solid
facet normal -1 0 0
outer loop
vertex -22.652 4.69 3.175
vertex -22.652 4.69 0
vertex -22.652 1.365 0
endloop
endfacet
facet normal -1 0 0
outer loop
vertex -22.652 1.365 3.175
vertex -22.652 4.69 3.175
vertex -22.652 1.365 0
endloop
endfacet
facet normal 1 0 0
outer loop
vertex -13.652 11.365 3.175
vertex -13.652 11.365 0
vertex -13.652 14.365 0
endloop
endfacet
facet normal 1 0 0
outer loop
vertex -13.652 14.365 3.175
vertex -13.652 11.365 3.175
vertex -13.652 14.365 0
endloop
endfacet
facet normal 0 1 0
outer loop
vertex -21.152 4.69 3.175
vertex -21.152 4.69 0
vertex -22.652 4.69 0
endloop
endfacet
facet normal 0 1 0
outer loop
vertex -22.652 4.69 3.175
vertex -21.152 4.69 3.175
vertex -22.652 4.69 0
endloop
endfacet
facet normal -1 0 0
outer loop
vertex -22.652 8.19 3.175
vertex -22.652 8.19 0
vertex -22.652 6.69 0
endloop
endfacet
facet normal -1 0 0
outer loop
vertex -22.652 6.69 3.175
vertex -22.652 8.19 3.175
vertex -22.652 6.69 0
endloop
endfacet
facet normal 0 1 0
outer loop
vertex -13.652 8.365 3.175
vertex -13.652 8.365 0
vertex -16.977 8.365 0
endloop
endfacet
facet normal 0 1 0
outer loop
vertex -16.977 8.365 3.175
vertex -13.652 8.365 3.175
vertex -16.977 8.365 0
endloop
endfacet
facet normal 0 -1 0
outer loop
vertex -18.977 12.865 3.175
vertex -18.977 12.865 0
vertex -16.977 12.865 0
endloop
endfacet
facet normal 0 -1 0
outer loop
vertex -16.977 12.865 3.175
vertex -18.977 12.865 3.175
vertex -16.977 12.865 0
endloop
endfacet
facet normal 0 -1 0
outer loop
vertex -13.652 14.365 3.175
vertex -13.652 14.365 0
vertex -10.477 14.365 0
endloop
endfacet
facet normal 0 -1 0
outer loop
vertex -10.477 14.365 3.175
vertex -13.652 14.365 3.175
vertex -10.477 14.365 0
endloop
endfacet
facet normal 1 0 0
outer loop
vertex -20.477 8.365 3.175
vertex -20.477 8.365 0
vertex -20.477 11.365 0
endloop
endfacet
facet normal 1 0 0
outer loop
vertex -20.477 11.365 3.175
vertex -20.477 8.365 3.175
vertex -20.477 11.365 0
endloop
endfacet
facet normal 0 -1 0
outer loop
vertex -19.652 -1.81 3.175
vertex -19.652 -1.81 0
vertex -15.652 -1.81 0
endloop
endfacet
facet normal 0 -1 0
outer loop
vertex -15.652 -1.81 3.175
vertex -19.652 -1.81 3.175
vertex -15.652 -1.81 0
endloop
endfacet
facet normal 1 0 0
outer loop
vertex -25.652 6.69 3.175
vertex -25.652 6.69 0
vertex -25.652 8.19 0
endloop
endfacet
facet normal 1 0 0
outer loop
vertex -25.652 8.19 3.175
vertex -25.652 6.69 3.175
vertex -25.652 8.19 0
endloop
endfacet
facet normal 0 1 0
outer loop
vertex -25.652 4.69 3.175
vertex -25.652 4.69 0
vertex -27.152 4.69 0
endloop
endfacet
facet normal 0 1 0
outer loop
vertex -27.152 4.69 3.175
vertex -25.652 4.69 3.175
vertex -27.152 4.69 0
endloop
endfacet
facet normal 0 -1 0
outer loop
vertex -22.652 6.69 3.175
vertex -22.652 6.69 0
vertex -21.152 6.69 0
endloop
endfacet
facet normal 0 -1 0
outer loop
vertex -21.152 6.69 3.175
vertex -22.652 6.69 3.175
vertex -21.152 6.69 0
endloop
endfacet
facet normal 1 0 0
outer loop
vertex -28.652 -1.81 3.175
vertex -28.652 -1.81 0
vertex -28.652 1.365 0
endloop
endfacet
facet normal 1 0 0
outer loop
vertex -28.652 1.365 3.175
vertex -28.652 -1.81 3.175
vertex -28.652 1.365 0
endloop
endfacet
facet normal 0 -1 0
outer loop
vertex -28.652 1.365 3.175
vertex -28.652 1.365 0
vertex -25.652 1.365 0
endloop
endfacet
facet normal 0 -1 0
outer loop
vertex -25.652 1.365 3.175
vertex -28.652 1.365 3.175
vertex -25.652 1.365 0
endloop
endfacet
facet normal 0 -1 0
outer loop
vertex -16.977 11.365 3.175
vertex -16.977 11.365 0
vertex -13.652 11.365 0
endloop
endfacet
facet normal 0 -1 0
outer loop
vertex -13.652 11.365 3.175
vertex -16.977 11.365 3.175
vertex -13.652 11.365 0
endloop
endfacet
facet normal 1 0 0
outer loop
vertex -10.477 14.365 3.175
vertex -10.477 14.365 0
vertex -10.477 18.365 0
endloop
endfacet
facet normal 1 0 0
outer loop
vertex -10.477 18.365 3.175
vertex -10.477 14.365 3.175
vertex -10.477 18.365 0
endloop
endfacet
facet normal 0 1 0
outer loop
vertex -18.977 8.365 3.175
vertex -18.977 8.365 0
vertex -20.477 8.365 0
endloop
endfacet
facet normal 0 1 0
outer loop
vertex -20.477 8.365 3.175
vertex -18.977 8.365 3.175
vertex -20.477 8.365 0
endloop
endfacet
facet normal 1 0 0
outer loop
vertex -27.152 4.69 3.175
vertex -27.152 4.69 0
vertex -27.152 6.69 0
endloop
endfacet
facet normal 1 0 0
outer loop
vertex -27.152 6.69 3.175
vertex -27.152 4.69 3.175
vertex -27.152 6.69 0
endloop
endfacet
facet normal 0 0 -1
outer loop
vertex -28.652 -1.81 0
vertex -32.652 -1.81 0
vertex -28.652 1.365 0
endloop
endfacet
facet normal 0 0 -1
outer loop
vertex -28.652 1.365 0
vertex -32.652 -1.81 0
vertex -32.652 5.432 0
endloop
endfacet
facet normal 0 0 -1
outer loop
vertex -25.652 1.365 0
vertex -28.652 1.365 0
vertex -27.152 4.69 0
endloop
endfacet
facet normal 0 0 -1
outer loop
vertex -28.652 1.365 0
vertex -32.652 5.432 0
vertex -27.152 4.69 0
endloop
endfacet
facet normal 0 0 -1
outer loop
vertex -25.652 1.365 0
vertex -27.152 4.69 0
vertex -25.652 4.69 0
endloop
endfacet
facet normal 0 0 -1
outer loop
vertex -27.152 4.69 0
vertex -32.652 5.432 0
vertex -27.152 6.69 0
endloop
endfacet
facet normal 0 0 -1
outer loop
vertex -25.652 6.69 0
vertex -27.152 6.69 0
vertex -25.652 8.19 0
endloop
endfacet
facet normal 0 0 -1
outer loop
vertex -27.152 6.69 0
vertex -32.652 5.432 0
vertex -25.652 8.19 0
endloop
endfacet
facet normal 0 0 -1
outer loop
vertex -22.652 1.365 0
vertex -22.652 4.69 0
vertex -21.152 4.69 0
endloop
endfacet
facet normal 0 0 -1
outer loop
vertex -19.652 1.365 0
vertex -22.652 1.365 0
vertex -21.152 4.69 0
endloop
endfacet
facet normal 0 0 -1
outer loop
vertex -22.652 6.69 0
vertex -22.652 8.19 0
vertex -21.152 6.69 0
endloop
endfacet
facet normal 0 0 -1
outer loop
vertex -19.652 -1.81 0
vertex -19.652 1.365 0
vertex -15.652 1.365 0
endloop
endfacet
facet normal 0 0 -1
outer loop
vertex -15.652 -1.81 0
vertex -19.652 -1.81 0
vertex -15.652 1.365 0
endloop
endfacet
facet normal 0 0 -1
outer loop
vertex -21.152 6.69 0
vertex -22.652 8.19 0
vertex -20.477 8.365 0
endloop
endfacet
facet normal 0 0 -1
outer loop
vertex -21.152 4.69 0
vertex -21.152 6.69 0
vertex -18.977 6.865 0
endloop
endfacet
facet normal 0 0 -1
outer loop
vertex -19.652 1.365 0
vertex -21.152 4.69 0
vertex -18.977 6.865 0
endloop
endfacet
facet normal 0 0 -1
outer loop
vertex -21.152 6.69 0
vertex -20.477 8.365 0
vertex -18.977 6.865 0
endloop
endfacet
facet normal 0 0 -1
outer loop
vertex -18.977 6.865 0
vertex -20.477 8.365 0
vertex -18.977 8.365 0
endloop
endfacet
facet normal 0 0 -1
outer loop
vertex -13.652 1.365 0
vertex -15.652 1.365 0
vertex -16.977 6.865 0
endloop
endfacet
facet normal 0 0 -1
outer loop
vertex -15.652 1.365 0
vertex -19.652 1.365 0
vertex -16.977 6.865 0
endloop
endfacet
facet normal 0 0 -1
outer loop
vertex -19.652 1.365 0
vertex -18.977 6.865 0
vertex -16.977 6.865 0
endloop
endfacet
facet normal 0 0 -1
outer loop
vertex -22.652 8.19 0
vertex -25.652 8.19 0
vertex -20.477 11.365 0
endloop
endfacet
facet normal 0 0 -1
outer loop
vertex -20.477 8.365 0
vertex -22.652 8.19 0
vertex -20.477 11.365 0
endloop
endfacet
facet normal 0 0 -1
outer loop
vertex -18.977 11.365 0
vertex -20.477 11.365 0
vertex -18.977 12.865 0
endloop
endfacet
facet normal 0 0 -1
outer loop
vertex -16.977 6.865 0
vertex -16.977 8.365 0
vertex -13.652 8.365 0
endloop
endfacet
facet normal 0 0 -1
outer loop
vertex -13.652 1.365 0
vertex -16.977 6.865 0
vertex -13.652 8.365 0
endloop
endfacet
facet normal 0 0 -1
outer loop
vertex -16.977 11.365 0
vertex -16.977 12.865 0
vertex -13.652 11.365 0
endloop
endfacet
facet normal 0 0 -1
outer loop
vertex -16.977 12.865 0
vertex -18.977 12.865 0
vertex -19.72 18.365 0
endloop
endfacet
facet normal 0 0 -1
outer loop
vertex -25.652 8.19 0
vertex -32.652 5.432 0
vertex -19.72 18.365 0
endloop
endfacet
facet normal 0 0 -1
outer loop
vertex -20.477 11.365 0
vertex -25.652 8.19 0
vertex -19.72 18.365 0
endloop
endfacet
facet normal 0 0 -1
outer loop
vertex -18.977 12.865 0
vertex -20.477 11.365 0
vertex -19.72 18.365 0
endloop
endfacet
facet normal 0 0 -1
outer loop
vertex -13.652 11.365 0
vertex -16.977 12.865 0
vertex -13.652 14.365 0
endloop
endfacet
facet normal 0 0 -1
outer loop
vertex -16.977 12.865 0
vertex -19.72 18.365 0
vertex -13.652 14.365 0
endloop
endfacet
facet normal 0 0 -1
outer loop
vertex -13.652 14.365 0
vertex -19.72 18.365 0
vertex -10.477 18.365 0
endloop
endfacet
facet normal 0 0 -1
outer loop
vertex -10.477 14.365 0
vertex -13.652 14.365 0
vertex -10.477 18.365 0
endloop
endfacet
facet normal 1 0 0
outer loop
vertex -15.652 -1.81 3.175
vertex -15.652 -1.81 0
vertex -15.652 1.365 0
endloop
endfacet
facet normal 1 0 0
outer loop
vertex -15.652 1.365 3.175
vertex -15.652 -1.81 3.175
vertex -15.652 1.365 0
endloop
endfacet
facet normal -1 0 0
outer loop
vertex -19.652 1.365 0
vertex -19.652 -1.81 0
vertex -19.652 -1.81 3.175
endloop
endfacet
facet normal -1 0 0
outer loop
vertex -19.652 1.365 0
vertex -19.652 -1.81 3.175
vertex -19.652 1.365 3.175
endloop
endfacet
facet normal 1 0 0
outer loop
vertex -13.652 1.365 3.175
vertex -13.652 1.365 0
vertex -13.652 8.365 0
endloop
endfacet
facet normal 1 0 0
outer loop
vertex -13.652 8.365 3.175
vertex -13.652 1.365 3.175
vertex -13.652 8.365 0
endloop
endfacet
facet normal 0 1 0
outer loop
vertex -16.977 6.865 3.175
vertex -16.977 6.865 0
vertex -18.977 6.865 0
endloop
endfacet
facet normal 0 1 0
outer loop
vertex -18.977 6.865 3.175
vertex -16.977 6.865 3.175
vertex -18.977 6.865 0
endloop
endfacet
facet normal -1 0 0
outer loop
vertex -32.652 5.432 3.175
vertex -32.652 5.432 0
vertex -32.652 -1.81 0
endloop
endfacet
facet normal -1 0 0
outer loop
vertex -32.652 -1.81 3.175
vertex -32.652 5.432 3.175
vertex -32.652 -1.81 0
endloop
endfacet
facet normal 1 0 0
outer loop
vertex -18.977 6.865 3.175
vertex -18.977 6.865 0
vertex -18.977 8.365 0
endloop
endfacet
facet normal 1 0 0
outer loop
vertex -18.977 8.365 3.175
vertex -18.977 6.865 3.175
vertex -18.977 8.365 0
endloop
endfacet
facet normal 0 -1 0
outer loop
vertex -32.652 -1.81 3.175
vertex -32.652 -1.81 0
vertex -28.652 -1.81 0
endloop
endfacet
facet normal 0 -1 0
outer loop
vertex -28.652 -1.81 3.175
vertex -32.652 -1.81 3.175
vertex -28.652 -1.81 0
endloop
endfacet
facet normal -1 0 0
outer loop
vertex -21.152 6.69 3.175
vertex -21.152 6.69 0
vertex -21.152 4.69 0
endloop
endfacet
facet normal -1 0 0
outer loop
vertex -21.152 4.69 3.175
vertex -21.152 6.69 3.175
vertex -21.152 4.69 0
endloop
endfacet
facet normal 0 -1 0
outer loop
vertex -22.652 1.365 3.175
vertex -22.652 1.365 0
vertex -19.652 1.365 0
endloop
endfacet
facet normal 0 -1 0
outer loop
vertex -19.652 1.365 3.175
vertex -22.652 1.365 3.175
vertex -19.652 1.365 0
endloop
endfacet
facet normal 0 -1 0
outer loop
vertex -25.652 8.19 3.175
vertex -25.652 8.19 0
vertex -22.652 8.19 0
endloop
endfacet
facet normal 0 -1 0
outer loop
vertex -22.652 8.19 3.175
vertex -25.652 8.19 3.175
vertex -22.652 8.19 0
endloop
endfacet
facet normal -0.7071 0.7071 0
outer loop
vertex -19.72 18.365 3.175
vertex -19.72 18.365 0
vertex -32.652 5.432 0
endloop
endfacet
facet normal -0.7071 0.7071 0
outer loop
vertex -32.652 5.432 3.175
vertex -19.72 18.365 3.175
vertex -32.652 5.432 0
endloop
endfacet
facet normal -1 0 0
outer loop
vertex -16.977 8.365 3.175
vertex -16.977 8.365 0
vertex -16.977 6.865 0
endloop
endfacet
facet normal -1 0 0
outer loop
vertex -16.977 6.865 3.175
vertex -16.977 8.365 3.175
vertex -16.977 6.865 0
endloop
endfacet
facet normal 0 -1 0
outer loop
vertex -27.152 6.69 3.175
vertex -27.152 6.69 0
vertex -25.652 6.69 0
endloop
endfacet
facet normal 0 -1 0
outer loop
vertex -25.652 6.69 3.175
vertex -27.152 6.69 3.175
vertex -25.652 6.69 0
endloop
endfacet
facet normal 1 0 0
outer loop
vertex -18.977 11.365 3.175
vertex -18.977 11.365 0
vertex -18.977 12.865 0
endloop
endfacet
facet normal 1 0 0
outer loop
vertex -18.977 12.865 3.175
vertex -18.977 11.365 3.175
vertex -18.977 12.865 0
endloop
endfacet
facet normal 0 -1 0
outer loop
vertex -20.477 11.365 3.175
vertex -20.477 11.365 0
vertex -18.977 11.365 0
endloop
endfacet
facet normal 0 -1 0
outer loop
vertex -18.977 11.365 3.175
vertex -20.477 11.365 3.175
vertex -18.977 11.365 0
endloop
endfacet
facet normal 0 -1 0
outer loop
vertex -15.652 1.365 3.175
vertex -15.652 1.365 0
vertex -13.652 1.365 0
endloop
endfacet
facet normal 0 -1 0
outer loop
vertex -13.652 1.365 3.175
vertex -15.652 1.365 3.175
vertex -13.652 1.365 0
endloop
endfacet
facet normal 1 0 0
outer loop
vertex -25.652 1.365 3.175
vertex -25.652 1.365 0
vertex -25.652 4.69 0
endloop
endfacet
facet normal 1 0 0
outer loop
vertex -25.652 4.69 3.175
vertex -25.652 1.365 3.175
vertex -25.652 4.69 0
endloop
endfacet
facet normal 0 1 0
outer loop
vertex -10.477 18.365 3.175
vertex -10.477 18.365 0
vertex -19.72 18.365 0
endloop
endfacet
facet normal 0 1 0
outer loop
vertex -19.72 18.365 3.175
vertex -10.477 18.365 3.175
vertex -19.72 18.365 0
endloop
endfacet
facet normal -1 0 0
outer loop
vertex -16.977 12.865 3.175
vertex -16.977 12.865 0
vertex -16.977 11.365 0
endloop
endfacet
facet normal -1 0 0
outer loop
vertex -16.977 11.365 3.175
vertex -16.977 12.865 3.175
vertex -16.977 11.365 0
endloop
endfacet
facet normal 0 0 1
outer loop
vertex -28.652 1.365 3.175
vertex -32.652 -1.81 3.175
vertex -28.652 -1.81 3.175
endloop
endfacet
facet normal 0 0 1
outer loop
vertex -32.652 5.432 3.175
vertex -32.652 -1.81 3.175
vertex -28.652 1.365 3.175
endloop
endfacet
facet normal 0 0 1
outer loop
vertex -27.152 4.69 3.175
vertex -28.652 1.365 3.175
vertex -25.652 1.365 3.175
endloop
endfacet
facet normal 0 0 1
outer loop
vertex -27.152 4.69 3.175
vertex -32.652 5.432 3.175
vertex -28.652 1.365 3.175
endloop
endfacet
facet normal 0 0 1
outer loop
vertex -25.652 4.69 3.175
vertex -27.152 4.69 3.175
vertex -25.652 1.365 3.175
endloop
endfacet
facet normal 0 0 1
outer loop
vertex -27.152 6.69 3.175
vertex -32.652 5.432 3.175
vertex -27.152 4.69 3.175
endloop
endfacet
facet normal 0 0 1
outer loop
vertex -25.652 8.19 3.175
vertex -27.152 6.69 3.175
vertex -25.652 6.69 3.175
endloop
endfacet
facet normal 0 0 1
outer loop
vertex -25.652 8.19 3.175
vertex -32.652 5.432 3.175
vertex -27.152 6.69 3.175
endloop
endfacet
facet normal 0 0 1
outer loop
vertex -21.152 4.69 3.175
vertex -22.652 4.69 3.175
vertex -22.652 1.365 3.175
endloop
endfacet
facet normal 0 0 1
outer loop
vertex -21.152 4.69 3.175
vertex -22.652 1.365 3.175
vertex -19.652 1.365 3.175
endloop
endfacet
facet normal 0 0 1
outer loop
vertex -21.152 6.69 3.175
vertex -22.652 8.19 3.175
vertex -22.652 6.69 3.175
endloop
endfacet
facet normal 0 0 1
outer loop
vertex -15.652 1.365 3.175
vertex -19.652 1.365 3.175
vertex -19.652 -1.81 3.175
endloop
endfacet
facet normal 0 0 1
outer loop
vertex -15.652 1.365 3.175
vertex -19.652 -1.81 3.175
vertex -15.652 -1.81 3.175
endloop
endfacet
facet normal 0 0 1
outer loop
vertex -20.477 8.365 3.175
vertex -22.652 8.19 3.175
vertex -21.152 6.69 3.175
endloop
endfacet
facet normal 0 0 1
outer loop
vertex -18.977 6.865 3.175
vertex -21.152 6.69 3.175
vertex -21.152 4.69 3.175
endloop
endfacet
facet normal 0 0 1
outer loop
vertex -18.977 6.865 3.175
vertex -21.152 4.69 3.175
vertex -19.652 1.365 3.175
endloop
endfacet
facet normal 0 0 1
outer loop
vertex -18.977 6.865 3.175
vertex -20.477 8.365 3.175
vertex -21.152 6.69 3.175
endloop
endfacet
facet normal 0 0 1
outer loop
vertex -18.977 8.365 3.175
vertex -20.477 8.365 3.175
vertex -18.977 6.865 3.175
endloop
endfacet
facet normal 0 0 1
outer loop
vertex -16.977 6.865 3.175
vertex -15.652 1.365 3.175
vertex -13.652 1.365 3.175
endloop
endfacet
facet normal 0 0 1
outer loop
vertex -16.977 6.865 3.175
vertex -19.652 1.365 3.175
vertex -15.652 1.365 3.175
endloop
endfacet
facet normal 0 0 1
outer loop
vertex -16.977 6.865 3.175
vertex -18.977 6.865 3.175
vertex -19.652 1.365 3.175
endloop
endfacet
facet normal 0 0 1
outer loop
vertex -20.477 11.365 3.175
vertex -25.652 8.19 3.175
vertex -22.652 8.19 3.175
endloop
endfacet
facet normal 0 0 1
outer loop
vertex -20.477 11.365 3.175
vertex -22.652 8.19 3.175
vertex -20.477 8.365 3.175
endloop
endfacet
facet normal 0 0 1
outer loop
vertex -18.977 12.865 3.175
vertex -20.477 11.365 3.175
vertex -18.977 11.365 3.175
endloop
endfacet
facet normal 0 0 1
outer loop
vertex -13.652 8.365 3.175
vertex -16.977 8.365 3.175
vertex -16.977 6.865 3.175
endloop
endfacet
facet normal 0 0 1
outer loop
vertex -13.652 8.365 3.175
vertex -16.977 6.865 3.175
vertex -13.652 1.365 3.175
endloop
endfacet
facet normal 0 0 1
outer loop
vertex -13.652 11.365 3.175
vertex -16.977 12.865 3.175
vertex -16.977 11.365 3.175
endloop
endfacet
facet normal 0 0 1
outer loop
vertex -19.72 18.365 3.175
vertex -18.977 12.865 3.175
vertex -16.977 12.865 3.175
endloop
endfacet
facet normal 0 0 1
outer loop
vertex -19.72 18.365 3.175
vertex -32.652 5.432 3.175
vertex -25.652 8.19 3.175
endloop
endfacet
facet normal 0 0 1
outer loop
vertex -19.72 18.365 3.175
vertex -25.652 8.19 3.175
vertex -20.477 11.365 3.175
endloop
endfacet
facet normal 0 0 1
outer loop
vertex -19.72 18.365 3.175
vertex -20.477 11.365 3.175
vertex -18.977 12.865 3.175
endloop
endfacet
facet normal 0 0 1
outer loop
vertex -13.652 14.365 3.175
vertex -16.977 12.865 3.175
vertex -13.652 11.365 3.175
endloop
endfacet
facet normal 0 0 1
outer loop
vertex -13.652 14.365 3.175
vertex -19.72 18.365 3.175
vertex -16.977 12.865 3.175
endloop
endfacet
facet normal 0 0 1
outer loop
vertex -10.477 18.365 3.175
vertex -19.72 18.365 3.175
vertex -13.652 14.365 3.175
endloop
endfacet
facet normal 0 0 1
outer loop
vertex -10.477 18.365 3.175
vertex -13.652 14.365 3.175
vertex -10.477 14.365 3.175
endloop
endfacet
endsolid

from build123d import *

# Parameters (mm, degrees)
F0_W     = 4
F0_H     = 3.175
F0_W_2   = 3.175
F0_H_2   = 4
F1_DEPTH = 3.175


# Not quite as in the source:
# - a length typed as a fraction of an inch, garbled in the dataset ("3 / 203.2 mm" for 3/8 in), is restored


with BuildPart() as f1:
    # F0 (on Top) → F1 (new body)
    with BuildSketch(Plane.XY):
        Polygon((-25.6521557152, 6.6896411628), (-25.6521557152, 8.1896411628), (-22.6521557152, 8.1896411628), (-22.6521557152, 6.6896411628), (-21.1521557152, 6.6896411628), (-21.1521557152, 4.6896411628), (-22.6521557152, 4.6896411628), (-22.6521557152, 1.3646411628), (-19.6521557152, 1.3646411628), (-15.6521557152, 1.3646411628), (-13.6521557152, 1.3646411628), (-13.6521557152, 5.3646411628), (-13.6521557152, 8.3646411628), (-16.9771557152, 8.3646411628), (-16.9771557152, 6.8646411628), (-18.9771557152, 6.8646411628), (-18.9771557152, 8.3646411628), (-20.4771557152, 8.3646411628), (-20.4771557152, 11.3646411628), (-18.9771557152, 11.3646411628), (-18.9771557152, 12.8646411628), (-16.9771557152, 12.8646411628), (-16.9771557152, 11.3646411628), (-13.6521557152, 11.3646411628), (-13.6521557152, 14.3646411628), (-13.6521557152, 18.3646411628), (-19.7197964023, 18.3646411628), (-32.6521557152, 5.4322818499), (-32.6521557152, 1.3646411628), (-28.6521557152, 1.3646411628), (-25.6521557152, 1.3646411628), (-25.6521557152, 4.6896411628), (-27.1521557152, 4.6896411628), (-27.1521557152, 6.6896411628), align=None)
        with Locations((-30.6521557152, -0.2228588372)):
            Rectangle(F0_W, F0_H)
        with Locations((-17.6521557152, -0.2228588372)):
            Rectangle(F0_W, F0_H)
        with Locations((-12.0646557152, 16.3646411628)):
            Rectangle(F0_W_2, F0_H_2)
    extrude(amount=F1_DEPTH)


solid = f1.part
